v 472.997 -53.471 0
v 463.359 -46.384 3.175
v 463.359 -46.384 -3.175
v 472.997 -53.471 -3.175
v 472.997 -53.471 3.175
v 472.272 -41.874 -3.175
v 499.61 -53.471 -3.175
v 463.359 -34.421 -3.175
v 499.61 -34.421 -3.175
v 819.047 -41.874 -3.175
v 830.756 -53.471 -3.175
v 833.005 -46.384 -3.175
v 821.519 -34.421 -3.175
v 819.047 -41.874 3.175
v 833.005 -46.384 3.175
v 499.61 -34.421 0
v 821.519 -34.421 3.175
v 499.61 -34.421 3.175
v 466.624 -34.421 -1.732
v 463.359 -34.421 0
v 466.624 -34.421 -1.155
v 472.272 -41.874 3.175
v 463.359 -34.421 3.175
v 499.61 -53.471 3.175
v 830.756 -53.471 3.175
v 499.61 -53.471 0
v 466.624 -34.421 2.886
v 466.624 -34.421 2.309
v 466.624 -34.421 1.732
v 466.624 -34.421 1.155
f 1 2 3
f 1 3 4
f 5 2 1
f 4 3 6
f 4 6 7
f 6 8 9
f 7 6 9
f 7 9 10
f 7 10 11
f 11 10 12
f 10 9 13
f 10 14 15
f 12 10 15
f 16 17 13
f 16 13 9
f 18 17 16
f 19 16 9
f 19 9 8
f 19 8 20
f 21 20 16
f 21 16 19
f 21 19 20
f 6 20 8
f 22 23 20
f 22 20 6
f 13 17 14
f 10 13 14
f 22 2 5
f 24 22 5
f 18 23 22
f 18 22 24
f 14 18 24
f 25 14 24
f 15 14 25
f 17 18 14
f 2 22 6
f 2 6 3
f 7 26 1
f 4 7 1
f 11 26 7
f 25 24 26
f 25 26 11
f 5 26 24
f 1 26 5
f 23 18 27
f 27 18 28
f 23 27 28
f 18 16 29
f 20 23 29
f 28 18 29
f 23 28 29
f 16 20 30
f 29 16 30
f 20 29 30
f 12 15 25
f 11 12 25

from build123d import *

# Parameters (mm, degrees)
BOSS_EXTRUDE1_DEPTH = 3.175
CUT_EXTRUDE1_DEPTH  = 7.3500001
FILLET1_R           = 2.54
CUT_EXTRUDE2_DEPTH  = 7.62


with BuildPart() as part:
    # Sketch1 → Boss-Extrude1 (new body, symmetric)
    with BuildSketch(Plane.XY):
        with BuildLine():
            Line((499.61002795, -53.470702797), (1046.28548189, -53.470702797))
            add(Edge.make_bspline(
                [(2669.54, -9.569049356), (2615.393603553, -13.17073937), (2561.080658619, -16.536108081), (2506.205230446, -19.758621957), (2430.209106802, -23.505211705), (2354.212983157, -26.631486423), (2332.570330468, -27.480988169), (2156.268639429, -34.377768543), (1979.966947376, -41.628631248), (1824.114277635, -52.771265877), (1636.928606778, -53.579569849), (1449.742935921, -53.454024613), (1418.006730935, -53.470702797), (1324.899336146, -53.470702797), (1231.791940344, -53.470702797), (1170.441269319, -53.470702797), (1108.784075813, -53.470702797), (1047.126882346, -53.470702797), (1046.846414188, -53.470702797), (1046.565947184, -53.470702797), (1046.28548189, -53.470702797)],
                knots=[103.698913506, 103.698913506, 103.698913506, 103.698913506, 103.698913506, 103.698913506, 130.927896619, 130.927896619, 130.927896619, 141.337054719, 141.337054719, 141.337054719, 218.101815019, 218.101815019, 218.101815019, 233.772059419, 233.772059419, 233.772059419, 264.077723219, 264.077723219, 264.077723219, 264.2162088, 264.2162088, 264.2162088, 264.2162088, 264.2162088, 264.2162088], degree=5))
            Line((2669.54, -9.569049356), (2669.54, 9.5231025))
            add(Edge.make_bspline(
                [(2669.54, 9.5231025), (2667.126494524, 9.36235515), (2659.861586685, 8.880281494), (2635.666282302, 7.292469146), (2596.857665529, 4.826056853), (2545.729743039, 1.758344093), (2494.405305707, -1.098555235), (2451.533022267, -3.266573297), (2417.198316756, -4.86708361), (2391.457076919, -6.003589235), (2365.634736307, -7.086854581), (2339.546284672, -8.137729944), (2313.466132974, -9.165138371), (2287.612375486, -10.179478215), (2261.763347437, -11.201032297), (2227.285329715, -12.583842557), (2184.175569393, -14.36607236), (2132.429066114, -16.607427868), (2063.4255234, -19.708920485), (1977.174907635, -23.700543313), (1873.732451432, -28.149389221), (1770.37461881, -31.657468649), (1667.085687813, -33.793117556), (1581.011094491, -34.383188831), (1512.07397126, -34.4278026), (1443.061513477, -34.409510402), (1356.800927879, -34.424432812), (1218.794626954, -34.418464788), (1115.289022786, -34.420702797), (1046.28548189, -34.420702797)],
                knots=[103.571582669, 103.571582669, 103.571582669, 103.571582669, 104.300777207, 105.766098403, 110.877392287, 115.98868617, 121.099980054, 126.211273938, 128.76692088, 131.322567822, 133.878214764, 136.433861706, 138.989508647, 141.545155589, 144.100802531, 146.656449473, 151.767743357, 156.879037241, 161.990331124, 172.212918892, 182.43550666, 192.658094427, 202.880682195, 213.103269962, 218.214563846, 223.32585773, 233.548445497, 243.771033265, 264.2162088, 264.2162088, 264.2162088, 264.2162088], degree=3))
            Line((1046.28548189, -34.420702797), (499.61002795, -34.420702797))
            add(Edge.make_bspline(
                [(499.61002795, -34.420702797), (488.614737518, -34.420702797), (472.236395365, -34.420702798), (449.940231846, -34.420702794), (427.771305695, -34.42070281), (405.874681663, -34.420702712), (384.584909128, -34.420702942), (368.900229326, -34.420702244), (353.376568613, -34.420704862), (332.608466435, -34.420689186), (306.287754853, -34.420570006), (274.023487704, -34.420538256), (252.271015965, -34.420709741), (241.425150134, -34.420702761)],
                knots=[19.90682951, 19.90682951, 19.90682951, 19.90682951, 23.220120017, 24.876765271, 26.533410525, 29.846701033, 31.503346286, 33.15999154, 34.816636794, 36.473282048, 39.786572556, 43.099863063, 46.413153571, 46.413153571, 46.413153571, 46.413153571], degree=3))
            add(Edge.make_bspline(
                [(241.425150134, -34.420702761), (239.394928853, -34.420701455), (235.322322927, -34.420495867), (227.274423443, -34.398702533), (217.319360062, -34.297466855), (205.530690077, -33.976385563), (189.963341914, -33.212641271), (170.696984653, -31.543495194), (147.533261232, -28.314398128), (125.482753206, -24.202109872), (109.358914834, -20.622537553), (100.964116069, -18.612521054), (99.06, -18.149327722)],
                knots=[0, 0, 0, 0, 0.622088422, 1.244176844, 2.488353689, 3.732530533, 4.976707377, 7.465061066, 9.953414755, 12.441768444, 14.55823542, 15.180323842, 15.180323842, 15.180323842, 15.180323842], degree=3))
            Line((99.06, -18.149327722), (99.06, -37.741485304))
            add(Edge.make_bspline(
                [(241.425137875, -53.470702761), (224.286916993, -53.470691732), (207.149474967, -53.467315374), (190.203897513, -52.686577078), (161.734965878, -49.987457476), (133.266034188, -45.175583375), (121.749620566, -42.910592695), (110.349390726, -40.420274627), (99.06, -37.741485304)],
                knots=[0, 0, 0, 0, 0, 0, 8.71381608, 8.71381608, 8.71381608, 14.701907176, 14.701907176, 14.701907176, 14.701907176, 14.701907176, 14.701907176], degree=5))
            add(Edge.make_bspline(
                [(499.61002795, -53.470702797), (492.136820835, -53.470702797), (484.754348064, -53.470702797), (477.443025859, -53.470702797), (448.516583145, -53.470702797), (419.590140517, -53.470702797), (398.368118521, -53.470702797), (355.647540186, -53.470702797), (312.926961851, -53.470702797), (289.235090436, -53.470293029), (265.364963651, -53.470705034), (241.4948369, -53.470702789), (241.471603891, -53.470702785), (241.448370882, -53.470702776), (241.425137875, -53.470702761)],
                knots=[19.90682951, 19.90682951, 19.90682951, 19.90682951, 19.90682951, 19.90682951, 23.637897311, 23.637897311, 23.637897311, 34.276545571, 34.276545571, 34.276545571, 46.401340901, 46.401340901, 46.401340901, 46.413153571, 46.413153571, 46.413153571, 46.413153571, 46.413153571, 46.413153571], degree=5))
        make_face()
    extrude(amount=BOSS_EXTRUDE1_DEPTH, both=True)

    # Sketch2 → Cut-Extrude1 (cut, through all)
    with BuildSketch(Plane.XY.offset(3.175)):
        with BuildLine():
            add(Edge.make_bspline(
                [(2312.9875, -9.183260037), (2304.505441691, -9.516700376), (2287.441020622, -10.186250162), (2261.763347437, -11.201032297), (2228.230552004, -12.545932515), (2203.310445107, -13.575047161), (2187.00995947, -14.263260037)],
                knots=[139.04033329, 139.04033329, 139.04033329, 139.04033329, 141.545155589, 144.100802531, 146.656449473, 151.487488909, 151.487488909, 151.487488909, 151.487488909], degree=3))
            Line((2187.00995947, -14.263260037), (2312.9875, -14.263260037))
            Line((2312.9875, -14.263260037), (2312.9875, -9.183260037))
        make_face()
    extrude(amount=-CUT_EXTRUDE1_DEPTH, mode=Mode.SUBTRACT)

    # Fillet1
    fillet1_edges = [part.edges().sort_by_distance(p)[0] for p in [
        (2669.54, -9.569049356, -1.5875),
        (2669.54, 9.5231025, -1.5875),
        (99.06, -37.741485304, -1.5875),
        (99.06, -18.149327722, -1.5875),
        (2312.9875, -9.183260037, 1.5875),
        (2312.9875, -14.263260037, 0),
    ]]
    fillet(fillet1_edges, radius=FILLET1_R)

    # Sketch3 → Cut-Extrude2 (cut)
    with BuildSketch(Plane.XY.offset(3.175)):
        Polygon((463.358597157, -34.420702797), (472.271656585, -41.874419167), (463.358597157, -46.384200616), (472.997412797, -53.470702797), (65.960080016, -189.871321367), (36.237397513, 16.701322029), (463.358597157, 108.26369674), align=None)
        Polygon((821.518882755, -34.420702797), (819.047328197, -41.874419167), (833.004793216, -46.384200616), (830.756310042, -53.470702797), (830.756310042, -93.67118026), (2725.490502614, -272.22369225), (2725.490502614, 129.691463791), (821.518882755, 129.691463791), align=None)
    extrude(amount=-CUT_EXTRUDE2_DEPTH, mode=Mode.SUBTRACT)


solid = part.part
